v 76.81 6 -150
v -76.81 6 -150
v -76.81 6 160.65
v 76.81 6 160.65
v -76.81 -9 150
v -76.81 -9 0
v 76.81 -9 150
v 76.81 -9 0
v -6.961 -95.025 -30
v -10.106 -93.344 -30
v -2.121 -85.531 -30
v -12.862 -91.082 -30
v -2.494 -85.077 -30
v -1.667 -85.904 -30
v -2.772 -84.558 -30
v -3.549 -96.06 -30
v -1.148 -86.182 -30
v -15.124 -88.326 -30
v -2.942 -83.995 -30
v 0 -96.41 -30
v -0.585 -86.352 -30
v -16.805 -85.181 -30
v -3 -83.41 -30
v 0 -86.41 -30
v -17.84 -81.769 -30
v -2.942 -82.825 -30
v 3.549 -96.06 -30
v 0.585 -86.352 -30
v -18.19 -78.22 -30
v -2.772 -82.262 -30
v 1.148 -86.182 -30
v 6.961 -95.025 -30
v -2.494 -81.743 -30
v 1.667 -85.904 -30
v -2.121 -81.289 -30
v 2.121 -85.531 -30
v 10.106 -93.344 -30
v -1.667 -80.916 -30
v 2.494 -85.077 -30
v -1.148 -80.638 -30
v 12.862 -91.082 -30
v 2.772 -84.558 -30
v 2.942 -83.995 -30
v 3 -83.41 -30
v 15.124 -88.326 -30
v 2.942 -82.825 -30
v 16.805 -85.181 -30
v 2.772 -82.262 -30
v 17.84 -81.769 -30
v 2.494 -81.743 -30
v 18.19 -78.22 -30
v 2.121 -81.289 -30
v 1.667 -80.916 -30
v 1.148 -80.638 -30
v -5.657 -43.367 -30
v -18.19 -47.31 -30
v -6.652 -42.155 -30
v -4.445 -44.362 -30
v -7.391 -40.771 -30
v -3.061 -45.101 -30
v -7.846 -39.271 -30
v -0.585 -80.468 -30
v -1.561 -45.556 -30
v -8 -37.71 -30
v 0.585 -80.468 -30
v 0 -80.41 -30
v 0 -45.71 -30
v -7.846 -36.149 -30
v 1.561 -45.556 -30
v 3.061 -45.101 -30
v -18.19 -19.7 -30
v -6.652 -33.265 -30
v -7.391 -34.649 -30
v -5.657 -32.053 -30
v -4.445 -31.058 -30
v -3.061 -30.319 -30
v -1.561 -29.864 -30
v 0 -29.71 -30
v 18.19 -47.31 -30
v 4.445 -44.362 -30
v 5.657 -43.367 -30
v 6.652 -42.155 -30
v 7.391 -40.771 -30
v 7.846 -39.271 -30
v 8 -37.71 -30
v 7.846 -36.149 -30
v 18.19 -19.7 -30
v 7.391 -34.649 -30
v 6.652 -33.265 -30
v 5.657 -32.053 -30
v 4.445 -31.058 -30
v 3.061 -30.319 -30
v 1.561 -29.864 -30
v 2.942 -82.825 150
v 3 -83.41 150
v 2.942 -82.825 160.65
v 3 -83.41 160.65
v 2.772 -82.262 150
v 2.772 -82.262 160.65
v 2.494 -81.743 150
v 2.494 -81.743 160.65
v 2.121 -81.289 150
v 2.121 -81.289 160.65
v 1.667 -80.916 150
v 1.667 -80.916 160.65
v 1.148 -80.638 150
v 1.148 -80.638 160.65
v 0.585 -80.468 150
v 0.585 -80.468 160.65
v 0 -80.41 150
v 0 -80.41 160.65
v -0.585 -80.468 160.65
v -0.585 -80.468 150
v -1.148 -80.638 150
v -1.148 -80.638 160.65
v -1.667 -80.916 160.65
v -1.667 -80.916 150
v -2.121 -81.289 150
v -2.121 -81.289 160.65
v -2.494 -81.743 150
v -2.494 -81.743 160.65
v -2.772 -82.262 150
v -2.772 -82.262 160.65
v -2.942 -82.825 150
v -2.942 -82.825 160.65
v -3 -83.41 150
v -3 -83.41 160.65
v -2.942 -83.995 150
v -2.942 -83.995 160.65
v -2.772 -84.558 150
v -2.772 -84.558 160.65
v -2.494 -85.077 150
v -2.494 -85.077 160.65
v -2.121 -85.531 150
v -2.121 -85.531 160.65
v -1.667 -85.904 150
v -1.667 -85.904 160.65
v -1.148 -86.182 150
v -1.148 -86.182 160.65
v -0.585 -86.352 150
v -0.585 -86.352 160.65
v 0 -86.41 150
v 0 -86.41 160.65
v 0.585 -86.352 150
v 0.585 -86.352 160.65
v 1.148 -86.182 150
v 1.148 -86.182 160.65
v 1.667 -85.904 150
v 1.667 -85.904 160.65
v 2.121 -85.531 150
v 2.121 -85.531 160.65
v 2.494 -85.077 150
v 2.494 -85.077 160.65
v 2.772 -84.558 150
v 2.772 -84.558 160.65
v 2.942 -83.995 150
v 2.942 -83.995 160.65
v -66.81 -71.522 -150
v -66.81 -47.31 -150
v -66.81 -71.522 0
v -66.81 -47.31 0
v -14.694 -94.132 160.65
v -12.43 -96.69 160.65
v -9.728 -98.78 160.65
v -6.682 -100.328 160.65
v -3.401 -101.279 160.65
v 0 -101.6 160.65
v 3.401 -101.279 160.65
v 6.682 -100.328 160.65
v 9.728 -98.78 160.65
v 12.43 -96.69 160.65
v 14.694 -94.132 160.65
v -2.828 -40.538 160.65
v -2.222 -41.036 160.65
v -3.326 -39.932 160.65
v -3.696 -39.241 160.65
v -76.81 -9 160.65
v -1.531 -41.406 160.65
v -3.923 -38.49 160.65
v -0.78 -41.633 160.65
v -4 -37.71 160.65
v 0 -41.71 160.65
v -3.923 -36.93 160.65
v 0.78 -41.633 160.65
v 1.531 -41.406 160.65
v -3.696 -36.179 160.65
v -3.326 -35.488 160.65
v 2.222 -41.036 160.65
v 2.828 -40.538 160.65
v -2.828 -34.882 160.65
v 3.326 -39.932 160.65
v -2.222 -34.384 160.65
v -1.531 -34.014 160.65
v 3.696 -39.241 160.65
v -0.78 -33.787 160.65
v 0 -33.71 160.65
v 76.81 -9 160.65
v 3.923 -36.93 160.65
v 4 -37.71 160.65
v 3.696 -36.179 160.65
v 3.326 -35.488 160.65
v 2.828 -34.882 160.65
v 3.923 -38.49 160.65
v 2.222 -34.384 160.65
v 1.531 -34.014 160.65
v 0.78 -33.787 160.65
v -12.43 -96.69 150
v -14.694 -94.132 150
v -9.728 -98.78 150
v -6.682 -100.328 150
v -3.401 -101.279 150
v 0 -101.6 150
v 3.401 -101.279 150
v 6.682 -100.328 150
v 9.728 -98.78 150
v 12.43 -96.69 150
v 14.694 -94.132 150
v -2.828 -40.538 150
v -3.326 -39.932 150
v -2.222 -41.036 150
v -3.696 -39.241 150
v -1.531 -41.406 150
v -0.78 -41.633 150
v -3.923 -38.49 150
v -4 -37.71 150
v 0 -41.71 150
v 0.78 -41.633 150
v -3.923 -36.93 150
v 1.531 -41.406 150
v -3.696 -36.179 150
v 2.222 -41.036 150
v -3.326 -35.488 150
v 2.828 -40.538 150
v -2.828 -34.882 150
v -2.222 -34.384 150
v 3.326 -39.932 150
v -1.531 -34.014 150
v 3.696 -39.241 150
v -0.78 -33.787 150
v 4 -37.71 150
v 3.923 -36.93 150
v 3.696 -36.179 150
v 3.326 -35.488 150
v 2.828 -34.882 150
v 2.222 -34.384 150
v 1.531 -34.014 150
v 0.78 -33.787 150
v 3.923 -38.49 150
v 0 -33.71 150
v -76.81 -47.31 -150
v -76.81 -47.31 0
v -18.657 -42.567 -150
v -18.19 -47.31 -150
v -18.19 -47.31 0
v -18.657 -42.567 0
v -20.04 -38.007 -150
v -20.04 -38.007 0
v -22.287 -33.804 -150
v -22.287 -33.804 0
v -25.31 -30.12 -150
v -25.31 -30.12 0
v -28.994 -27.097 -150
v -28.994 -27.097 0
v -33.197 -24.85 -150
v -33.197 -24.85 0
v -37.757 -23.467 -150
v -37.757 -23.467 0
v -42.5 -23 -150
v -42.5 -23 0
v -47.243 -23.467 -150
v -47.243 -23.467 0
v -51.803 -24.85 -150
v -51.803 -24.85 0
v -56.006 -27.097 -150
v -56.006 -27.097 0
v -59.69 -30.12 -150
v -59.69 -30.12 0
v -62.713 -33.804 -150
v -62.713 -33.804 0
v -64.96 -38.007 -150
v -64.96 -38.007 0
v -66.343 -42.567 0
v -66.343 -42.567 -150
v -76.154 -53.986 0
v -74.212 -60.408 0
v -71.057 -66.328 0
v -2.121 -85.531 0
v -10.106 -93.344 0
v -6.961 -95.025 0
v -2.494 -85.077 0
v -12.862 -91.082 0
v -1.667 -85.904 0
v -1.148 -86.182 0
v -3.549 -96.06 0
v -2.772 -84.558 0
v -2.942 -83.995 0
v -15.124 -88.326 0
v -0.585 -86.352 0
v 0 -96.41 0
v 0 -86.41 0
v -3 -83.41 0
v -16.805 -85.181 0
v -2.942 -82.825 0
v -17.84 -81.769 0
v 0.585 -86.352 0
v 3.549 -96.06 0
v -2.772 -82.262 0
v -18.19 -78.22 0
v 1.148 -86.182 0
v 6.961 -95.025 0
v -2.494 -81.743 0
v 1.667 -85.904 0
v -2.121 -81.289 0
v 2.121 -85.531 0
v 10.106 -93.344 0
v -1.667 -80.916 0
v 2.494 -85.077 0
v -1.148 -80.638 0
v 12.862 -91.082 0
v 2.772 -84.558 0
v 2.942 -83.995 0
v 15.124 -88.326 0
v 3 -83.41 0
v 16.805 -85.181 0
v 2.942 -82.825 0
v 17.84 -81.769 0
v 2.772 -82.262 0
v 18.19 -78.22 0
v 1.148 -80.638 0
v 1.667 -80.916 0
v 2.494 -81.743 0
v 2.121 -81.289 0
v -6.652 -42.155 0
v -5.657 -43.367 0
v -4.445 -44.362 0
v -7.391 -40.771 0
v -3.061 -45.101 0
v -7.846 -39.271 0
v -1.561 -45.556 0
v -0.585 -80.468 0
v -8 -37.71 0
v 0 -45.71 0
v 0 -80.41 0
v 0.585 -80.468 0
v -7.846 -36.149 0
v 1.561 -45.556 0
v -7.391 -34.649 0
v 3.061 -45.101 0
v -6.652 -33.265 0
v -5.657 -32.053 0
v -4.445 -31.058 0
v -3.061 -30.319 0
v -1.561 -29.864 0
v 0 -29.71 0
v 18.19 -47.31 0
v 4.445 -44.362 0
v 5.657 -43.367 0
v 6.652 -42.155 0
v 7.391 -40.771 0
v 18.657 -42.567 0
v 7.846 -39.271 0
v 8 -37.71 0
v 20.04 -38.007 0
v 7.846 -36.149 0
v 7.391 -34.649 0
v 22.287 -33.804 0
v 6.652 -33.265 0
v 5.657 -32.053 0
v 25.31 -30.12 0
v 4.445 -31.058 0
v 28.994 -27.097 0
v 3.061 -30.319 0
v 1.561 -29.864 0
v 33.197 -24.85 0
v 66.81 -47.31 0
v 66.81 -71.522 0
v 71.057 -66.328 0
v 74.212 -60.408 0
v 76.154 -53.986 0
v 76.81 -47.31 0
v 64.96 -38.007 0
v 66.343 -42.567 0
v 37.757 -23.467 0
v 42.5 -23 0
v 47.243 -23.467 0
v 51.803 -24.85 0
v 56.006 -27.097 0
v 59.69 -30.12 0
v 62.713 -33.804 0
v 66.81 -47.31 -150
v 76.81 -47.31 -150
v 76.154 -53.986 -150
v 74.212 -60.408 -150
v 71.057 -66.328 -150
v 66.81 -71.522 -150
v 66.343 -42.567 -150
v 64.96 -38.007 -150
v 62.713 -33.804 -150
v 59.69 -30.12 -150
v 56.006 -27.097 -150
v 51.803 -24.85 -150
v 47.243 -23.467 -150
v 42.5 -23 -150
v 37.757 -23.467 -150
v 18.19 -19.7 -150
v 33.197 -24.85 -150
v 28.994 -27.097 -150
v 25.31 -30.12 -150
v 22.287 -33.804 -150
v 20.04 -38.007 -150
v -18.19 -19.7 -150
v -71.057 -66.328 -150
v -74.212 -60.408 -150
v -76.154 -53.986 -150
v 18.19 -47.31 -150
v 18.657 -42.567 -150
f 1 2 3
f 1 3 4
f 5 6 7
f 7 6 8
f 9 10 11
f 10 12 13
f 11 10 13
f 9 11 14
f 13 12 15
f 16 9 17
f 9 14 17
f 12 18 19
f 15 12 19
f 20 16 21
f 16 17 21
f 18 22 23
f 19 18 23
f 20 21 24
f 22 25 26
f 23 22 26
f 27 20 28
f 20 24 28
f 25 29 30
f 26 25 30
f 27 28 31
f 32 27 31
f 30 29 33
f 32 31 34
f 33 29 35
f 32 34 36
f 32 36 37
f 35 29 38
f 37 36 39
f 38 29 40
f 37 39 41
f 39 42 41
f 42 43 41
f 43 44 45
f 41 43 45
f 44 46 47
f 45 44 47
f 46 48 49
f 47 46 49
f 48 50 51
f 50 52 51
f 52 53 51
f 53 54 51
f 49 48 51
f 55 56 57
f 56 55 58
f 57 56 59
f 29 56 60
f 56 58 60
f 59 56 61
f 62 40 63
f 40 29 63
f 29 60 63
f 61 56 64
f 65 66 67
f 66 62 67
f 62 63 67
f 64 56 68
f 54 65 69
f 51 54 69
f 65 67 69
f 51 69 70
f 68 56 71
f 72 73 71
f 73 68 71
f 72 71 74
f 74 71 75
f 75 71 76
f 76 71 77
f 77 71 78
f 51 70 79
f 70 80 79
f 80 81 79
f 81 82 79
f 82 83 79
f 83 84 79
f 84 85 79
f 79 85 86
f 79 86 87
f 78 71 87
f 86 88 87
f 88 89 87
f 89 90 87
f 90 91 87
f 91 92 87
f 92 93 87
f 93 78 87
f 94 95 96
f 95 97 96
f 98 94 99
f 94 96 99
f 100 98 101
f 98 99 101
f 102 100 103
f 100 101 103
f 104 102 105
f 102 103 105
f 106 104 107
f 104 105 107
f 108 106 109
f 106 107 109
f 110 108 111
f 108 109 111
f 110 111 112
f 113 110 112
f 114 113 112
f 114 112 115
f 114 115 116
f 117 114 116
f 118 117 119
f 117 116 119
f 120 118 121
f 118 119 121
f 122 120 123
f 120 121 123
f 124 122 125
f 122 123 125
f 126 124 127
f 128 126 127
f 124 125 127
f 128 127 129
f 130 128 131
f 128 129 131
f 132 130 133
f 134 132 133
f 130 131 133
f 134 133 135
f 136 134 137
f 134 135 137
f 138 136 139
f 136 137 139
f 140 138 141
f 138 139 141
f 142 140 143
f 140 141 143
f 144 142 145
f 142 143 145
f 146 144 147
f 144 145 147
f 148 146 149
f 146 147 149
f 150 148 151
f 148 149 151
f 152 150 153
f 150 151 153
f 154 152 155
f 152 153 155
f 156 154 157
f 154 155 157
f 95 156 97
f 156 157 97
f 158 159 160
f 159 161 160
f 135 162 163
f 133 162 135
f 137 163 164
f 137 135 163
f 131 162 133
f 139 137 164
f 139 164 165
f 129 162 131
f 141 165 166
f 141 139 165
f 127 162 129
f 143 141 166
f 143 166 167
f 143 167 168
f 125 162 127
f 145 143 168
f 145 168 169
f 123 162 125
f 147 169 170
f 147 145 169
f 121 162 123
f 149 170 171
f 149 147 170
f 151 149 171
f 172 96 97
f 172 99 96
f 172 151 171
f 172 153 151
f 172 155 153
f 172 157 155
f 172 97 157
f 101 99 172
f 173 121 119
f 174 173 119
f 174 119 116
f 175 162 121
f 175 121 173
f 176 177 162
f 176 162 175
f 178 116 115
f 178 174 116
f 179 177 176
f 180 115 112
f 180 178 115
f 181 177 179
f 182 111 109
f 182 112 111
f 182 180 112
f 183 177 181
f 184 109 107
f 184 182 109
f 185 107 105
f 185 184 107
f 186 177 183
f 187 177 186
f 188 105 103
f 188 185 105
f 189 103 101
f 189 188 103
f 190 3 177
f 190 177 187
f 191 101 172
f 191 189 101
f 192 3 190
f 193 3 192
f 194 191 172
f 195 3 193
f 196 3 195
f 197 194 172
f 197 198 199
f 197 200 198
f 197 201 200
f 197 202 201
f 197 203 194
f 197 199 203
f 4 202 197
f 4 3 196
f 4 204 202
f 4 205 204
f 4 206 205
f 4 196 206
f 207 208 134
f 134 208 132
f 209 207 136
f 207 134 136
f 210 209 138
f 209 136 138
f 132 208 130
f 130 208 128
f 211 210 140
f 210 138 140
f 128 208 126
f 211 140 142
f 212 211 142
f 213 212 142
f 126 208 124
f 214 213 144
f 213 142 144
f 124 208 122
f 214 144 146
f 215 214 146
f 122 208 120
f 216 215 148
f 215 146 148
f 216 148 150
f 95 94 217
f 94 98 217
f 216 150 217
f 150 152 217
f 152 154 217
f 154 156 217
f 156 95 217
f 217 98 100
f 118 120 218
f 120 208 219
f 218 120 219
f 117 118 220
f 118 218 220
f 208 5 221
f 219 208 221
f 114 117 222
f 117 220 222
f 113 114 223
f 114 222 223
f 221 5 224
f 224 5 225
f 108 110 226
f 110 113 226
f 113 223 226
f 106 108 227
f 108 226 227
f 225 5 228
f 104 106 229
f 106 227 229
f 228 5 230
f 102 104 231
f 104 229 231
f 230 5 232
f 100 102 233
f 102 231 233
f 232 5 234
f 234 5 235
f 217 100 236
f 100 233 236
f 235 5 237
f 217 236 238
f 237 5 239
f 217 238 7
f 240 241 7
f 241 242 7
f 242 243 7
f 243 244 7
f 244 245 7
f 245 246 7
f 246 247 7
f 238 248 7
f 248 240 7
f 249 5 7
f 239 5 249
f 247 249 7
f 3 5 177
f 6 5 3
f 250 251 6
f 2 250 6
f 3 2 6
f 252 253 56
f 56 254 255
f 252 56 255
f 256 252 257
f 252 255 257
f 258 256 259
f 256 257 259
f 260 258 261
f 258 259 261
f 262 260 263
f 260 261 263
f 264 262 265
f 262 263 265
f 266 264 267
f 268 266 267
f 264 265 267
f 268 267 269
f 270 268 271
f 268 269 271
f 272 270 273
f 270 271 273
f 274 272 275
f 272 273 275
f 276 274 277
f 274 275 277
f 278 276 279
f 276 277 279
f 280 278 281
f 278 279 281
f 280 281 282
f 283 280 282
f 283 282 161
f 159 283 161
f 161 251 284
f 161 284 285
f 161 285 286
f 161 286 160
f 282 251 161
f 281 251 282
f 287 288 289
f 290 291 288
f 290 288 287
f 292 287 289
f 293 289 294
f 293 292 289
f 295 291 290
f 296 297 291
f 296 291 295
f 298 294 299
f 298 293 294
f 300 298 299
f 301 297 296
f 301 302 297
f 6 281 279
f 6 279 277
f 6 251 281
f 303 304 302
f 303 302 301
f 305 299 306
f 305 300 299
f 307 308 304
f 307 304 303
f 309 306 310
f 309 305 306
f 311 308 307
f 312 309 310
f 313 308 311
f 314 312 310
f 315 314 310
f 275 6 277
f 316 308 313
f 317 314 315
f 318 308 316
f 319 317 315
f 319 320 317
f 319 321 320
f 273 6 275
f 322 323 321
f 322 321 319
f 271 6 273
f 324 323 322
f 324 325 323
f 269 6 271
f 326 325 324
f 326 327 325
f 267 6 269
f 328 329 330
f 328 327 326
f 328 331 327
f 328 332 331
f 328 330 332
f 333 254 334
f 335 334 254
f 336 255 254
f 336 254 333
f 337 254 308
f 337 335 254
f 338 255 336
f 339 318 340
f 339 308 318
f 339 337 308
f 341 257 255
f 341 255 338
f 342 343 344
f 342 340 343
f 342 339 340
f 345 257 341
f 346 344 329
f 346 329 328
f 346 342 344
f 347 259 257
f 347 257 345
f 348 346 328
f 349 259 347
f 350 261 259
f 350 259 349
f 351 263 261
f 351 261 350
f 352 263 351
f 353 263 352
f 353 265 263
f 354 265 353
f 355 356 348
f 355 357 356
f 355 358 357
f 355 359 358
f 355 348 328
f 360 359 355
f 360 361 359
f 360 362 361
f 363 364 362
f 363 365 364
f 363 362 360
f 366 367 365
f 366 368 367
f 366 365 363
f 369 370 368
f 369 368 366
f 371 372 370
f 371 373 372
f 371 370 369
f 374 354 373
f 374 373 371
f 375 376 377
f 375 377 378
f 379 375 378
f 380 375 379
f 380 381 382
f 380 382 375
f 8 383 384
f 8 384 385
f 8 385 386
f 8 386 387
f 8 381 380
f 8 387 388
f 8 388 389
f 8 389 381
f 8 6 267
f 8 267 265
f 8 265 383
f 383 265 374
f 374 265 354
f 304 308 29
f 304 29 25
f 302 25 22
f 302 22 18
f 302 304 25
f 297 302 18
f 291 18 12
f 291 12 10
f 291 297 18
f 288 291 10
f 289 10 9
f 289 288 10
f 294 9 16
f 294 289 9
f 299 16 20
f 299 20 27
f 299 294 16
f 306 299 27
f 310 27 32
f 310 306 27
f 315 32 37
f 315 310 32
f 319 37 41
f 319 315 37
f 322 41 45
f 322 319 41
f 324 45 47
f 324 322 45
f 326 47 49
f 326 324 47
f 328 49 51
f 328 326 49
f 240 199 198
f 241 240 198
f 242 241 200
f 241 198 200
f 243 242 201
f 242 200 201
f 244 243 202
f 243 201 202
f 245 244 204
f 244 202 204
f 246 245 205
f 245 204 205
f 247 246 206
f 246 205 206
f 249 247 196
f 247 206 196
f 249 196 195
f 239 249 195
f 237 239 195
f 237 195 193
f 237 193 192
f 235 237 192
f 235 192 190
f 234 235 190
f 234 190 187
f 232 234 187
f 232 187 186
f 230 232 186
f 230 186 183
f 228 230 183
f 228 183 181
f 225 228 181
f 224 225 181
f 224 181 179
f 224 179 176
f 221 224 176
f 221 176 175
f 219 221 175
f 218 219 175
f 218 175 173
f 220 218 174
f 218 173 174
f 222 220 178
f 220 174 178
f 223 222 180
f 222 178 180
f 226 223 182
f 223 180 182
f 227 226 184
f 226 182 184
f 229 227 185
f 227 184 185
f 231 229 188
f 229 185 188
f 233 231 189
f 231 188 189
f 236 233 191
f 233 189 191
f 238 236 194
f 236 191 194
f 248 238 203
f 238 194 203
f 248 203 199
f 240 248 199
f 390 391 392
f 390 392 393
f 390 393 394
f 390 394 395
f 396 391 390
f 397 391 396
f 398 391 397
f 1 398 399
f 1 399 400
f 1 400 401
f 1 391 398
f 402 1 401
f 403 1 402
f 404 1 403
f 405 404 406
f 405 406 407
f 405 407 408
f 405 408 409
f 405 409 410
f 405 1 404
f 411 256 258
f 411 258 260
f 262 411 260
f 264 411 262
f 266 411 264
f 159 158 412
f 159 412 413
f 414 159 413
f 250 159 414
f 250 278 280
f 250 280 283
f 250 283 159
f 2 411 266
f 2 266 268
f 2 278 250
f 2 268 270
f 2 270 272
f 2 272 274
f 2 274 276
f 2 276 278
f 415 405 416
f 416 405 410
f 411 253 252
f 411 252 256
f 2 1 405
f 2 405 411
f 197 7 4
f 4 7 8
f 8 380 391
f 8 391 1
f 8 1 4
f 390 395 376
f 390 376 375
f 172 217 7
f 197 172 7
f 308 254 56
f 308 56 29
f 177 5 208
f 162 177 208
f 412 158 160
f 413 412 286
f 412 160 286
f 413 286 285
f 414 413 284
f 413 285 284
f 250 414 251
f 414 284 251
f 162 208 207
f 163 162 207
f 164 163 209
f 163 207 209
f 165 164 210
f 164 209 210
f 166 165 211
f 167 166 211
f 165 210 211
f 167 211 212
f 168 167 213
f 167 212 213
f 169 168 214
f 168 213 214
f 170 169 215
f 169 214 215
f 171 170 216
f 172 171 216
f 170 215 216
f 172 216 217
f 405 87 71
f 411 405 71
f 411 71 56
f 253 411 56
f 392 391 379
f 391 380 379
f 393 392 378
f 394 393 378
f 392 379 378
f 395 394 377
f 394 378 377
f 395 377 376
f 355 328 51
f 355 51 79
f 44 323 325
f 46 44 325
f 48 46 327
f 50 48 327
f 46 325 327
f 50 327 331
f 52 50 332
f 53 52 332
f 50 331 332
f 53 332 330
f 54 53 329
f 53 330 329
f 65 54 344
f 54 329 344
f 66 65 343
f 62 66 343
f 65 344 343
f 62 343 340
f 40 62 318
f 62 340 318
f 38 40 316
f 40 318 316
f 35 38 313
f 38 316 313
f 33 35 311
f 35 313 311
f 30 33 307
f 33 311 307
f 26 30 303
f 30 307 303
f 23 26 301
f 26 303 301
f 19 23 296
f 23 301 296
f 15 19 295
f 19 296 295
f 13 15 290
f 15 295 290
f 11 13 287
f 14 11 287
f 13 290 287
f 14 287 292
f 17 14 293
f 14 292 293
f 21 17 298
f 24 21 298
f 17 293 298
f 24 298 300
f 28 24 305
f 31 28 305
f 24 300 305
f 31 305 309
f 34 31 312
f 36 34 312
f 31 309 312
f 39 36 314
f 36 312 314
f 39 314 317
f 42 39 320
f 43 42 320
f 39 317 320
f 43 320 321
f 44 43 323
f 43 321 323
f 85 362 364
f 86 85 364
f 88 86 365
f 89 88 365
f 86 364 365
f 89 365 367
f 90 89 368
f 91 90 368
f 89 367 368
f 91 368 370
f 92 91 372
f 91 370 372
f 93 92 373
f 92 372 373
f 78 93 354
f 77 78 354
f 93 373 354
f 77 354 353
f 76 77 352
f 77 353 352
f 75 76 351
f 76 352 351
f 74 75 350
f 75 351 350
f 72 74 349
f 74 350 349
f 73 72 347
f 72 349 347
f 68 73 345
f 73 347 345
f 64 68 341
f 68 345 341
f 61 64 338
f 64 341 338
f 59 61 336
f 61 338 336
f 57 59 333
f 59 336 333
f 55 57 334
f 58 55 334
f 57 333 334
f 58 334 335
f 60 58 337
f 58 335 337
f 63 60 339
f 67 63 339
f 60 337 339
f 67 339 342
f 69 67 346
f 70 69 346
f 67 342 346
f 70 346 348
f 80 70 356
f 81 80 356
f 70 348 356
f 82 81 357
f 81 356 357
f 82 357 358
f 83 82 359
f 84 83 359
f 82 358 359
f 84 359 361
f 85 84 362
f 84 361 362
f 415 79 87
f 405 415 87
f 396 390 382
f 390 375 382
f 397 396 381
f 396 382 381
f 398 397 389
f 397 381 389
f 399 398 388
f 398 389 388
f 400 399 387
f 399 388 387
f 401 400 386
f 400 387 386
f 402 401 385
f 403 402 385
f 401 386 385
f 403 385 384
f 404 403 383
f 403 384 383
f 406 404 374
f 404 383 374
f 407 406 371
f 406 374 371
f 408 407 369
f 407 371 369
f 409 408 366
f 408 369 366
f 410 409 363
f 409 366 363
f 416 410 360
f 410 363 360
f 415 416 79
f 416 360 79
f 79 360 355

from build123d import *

# Parameters (mm, degrees)
SKETCH1_R           = 3
SKETCH1_R_2         = 8
BOSS_EXTRUDE1_DEPTH = 30
BOSS_EXTRUDE2_DEPTH = 120
SKETCH5_W           = 153.62
SKETCH5_H           = 9
SKETCH5_H_2         = 6
BOSS_EXTRUDE3_DEPTH = 150
SKETCH6_W           = 153.62
SKETCH6_H           = 6
BOSS_EXTRUDE4_DEPTH = 150
SKETCH7_W           = 153.62
SKETCH7_H           = 15
SKETCH7_R           = 18.19
BOSS_EXTRUDE5_DEPTH = 10.65
CUT_EXTRUDE1_REACH  = 337.747
SKETCH8_R           = 3
SKETCH8_R_2         = 4


with BuildPart() as part:
    # Sketch1 → Boss-Extrude1 (new body)
    with BuildSketch(Plane.XY):
        with BuildLine():
            Line((-18.19, -47.31), (-18.19, -78.22))
            ThreePointArc((-18.19, -78.22), (0, -96.41), (18.19, -78.22))
            Line((18.19, -78.22), (18.19, -47.31))
            ThreePointArc((18.19, -47.31), (42.5, -23), (66.81, -47.31))
            Line((66.81, -47.31), (66.81, -71.521567483))
            ThreePointArc((66.81, -71.521567483), (74.211608285, -60.407709723), (76.81, -47.31))
            Line((76.81, -47.31), (76.81, 0))
            Line((76.81, 0), (-76.81, 0))
            Line((-76.81, 0), (-76.81, -47.31))
            ThreePointArc((-76.81, -47.31), (-74.211608285, -60.407709723), (-66.81, -71.521567483))
            Line((-66.81, -71.521567483), (-66.81, -47.31))
            ThreePointArc((-66.81, -47.31), (-42.5, -23), (-18.19, -47.31))
        make_face()
        with Locations((0, -83.41)):
            Circle(SKETCH1_R, mode=Mode.SUBTRACT)
        with Locations((0, -37.71)):
            Circle(SKETCH1_R_2, mode=Mode.SUBTRACT)
    extrude(amount=-BOSS_EXTRUDE1_DEPTH)

    # Sketch3 → Boss-Extrude2 (add)
    with BuildSketch(Plane(origin=(0, 0, -30), x_dir=(-1, 0, 0), z_dir=(0, 0, -1))):
        with BuildLine():
            Line((-76.81, 0), (-76.81, -47.31))
            ThreePointArc((-76.81, -47.31), (-74.211608285, -60.407709723), (-66.81, -71.521567483))
            Line((-66.81, -71.521567483), (-66.81, -47.31))
            ThreePointArc((-66.81, -47.31), (-42.5, -23), (-18.19, -47.31))
            Line((-18.19, -47.31), (-18.19, -19.7))
            Line((-18.19, -19.7), (18.19, -19.7))
            Line((18.19, -19.7), (18.19, -47.31))
            ThreePointArc((18.19, -47.31), (42.5, -23), (66.81, -47.31))
            Line((66.81, -47.31), (66.81, -71.521567483))
            ThreePointArc((66.81, -71.521567483), (74.211608285, -60.407709723), (76.81, -47.31))
            Line((76.81, -47.31), (76.81, 0))
            Line((76.81, 0), (-76.81, 0))
        make_face()
    extrude(amount=BOSS_EXTRUDE2_DEPTH)

    # Sketch5 → Boss-Extrude3 (add)
    with BuildSketch(Plane.XY):
        with Locations((0, -4.5)):
            Rectangle(SKETCH5_W, SKETCH5_H)
        with Locations((0, 3)):
            Rectangle(SKETCH5_W, SKETCH5_H_2)
    extrude(amount=BOSS_EXTRUDE3_DEPTH)

    # Sketch6 → Boss-Extrude4 (add)
    with BuildSketch(Plane(origin=(0, 0, 0), x_dir=(-1, 0, 0), z_dir=(0, 0, -1))):
        with Locations((0, 3)):
            Rectangle(SKETCH6_W, SKETCH6_H)
    extrude(amount=BOSS_EXTRUDE4_DEPTH)

    # Sketch7 → Boss-Extrude5 (add)
    with BuildSketch(Plane.XY.offset(150)):
        with BuildLine():
            Line((-76.81, -9), (-14.694324823, -94.13160986))
            ThreePointArc((-14.694324823, -94.13160986), (-5.638542873, -66.115985594), (18.19, -83.41))
            ThreePointArc((18.19, -83.41), (17.294014406, -89.048542873), (14.694324823, -94.13160986))
            Line((14.694324823, -94.13160986), (76.81, -9))
            Line((76.81, -9), (-76.81, -9))
        make_face()
        with Locations((0, -1.5)):
            Rectangle(SKETCH7_W, SKETCH7_H)
        with Locations((0, -83.41)):
            Circle(SKETCH7_R)
    extrude(amount=BOSS_EXTRUDE5_DEPTH)

    # Sketch8 → Cut-Extrude1 (cut, up to next)
    with BuildSketch(Plane.XY.offset(160.65), mode=Mode.PRIVATE) as cut_extrude1_sk1:
        with Locations((0, -83.41)):
            Circle(SKETCH8_R)
    cut_extrude1_tool1 = extrude(cut_extrude1_sk1.sketch, amount=-CUT_EXTRUDE1_REACH, mode=Mode.PRIVATE) & part.part
    # Sketch8 → Cut-Extrude1 (cut, up to next)
    with BuildSketch(Plane.XY.offset(160.65), mode=Mode.PRIVATE) as cut_extrude1_sk2:
        with Locations((0, -37.71)):
            Circle(SKETCH8_R_2)
    cut_extrude1_tool2 = extrude(cut_extrude1_sk2.sketch, amount=-CUT_EXTRUDE1_REACH, mode=Mode.PRIVATE) & part.part
    add(cut_extrude1_tool1.solids().sort_by_distance((0, -83.41, 160.65))[0], mode=Mode.SUBTRACT)
    add(cut_extrude1_tool2.solids().sort_by_distance((0, -37.71, 160.65))[0], mode=Mode.SUBTRACT)


solid = part.part
